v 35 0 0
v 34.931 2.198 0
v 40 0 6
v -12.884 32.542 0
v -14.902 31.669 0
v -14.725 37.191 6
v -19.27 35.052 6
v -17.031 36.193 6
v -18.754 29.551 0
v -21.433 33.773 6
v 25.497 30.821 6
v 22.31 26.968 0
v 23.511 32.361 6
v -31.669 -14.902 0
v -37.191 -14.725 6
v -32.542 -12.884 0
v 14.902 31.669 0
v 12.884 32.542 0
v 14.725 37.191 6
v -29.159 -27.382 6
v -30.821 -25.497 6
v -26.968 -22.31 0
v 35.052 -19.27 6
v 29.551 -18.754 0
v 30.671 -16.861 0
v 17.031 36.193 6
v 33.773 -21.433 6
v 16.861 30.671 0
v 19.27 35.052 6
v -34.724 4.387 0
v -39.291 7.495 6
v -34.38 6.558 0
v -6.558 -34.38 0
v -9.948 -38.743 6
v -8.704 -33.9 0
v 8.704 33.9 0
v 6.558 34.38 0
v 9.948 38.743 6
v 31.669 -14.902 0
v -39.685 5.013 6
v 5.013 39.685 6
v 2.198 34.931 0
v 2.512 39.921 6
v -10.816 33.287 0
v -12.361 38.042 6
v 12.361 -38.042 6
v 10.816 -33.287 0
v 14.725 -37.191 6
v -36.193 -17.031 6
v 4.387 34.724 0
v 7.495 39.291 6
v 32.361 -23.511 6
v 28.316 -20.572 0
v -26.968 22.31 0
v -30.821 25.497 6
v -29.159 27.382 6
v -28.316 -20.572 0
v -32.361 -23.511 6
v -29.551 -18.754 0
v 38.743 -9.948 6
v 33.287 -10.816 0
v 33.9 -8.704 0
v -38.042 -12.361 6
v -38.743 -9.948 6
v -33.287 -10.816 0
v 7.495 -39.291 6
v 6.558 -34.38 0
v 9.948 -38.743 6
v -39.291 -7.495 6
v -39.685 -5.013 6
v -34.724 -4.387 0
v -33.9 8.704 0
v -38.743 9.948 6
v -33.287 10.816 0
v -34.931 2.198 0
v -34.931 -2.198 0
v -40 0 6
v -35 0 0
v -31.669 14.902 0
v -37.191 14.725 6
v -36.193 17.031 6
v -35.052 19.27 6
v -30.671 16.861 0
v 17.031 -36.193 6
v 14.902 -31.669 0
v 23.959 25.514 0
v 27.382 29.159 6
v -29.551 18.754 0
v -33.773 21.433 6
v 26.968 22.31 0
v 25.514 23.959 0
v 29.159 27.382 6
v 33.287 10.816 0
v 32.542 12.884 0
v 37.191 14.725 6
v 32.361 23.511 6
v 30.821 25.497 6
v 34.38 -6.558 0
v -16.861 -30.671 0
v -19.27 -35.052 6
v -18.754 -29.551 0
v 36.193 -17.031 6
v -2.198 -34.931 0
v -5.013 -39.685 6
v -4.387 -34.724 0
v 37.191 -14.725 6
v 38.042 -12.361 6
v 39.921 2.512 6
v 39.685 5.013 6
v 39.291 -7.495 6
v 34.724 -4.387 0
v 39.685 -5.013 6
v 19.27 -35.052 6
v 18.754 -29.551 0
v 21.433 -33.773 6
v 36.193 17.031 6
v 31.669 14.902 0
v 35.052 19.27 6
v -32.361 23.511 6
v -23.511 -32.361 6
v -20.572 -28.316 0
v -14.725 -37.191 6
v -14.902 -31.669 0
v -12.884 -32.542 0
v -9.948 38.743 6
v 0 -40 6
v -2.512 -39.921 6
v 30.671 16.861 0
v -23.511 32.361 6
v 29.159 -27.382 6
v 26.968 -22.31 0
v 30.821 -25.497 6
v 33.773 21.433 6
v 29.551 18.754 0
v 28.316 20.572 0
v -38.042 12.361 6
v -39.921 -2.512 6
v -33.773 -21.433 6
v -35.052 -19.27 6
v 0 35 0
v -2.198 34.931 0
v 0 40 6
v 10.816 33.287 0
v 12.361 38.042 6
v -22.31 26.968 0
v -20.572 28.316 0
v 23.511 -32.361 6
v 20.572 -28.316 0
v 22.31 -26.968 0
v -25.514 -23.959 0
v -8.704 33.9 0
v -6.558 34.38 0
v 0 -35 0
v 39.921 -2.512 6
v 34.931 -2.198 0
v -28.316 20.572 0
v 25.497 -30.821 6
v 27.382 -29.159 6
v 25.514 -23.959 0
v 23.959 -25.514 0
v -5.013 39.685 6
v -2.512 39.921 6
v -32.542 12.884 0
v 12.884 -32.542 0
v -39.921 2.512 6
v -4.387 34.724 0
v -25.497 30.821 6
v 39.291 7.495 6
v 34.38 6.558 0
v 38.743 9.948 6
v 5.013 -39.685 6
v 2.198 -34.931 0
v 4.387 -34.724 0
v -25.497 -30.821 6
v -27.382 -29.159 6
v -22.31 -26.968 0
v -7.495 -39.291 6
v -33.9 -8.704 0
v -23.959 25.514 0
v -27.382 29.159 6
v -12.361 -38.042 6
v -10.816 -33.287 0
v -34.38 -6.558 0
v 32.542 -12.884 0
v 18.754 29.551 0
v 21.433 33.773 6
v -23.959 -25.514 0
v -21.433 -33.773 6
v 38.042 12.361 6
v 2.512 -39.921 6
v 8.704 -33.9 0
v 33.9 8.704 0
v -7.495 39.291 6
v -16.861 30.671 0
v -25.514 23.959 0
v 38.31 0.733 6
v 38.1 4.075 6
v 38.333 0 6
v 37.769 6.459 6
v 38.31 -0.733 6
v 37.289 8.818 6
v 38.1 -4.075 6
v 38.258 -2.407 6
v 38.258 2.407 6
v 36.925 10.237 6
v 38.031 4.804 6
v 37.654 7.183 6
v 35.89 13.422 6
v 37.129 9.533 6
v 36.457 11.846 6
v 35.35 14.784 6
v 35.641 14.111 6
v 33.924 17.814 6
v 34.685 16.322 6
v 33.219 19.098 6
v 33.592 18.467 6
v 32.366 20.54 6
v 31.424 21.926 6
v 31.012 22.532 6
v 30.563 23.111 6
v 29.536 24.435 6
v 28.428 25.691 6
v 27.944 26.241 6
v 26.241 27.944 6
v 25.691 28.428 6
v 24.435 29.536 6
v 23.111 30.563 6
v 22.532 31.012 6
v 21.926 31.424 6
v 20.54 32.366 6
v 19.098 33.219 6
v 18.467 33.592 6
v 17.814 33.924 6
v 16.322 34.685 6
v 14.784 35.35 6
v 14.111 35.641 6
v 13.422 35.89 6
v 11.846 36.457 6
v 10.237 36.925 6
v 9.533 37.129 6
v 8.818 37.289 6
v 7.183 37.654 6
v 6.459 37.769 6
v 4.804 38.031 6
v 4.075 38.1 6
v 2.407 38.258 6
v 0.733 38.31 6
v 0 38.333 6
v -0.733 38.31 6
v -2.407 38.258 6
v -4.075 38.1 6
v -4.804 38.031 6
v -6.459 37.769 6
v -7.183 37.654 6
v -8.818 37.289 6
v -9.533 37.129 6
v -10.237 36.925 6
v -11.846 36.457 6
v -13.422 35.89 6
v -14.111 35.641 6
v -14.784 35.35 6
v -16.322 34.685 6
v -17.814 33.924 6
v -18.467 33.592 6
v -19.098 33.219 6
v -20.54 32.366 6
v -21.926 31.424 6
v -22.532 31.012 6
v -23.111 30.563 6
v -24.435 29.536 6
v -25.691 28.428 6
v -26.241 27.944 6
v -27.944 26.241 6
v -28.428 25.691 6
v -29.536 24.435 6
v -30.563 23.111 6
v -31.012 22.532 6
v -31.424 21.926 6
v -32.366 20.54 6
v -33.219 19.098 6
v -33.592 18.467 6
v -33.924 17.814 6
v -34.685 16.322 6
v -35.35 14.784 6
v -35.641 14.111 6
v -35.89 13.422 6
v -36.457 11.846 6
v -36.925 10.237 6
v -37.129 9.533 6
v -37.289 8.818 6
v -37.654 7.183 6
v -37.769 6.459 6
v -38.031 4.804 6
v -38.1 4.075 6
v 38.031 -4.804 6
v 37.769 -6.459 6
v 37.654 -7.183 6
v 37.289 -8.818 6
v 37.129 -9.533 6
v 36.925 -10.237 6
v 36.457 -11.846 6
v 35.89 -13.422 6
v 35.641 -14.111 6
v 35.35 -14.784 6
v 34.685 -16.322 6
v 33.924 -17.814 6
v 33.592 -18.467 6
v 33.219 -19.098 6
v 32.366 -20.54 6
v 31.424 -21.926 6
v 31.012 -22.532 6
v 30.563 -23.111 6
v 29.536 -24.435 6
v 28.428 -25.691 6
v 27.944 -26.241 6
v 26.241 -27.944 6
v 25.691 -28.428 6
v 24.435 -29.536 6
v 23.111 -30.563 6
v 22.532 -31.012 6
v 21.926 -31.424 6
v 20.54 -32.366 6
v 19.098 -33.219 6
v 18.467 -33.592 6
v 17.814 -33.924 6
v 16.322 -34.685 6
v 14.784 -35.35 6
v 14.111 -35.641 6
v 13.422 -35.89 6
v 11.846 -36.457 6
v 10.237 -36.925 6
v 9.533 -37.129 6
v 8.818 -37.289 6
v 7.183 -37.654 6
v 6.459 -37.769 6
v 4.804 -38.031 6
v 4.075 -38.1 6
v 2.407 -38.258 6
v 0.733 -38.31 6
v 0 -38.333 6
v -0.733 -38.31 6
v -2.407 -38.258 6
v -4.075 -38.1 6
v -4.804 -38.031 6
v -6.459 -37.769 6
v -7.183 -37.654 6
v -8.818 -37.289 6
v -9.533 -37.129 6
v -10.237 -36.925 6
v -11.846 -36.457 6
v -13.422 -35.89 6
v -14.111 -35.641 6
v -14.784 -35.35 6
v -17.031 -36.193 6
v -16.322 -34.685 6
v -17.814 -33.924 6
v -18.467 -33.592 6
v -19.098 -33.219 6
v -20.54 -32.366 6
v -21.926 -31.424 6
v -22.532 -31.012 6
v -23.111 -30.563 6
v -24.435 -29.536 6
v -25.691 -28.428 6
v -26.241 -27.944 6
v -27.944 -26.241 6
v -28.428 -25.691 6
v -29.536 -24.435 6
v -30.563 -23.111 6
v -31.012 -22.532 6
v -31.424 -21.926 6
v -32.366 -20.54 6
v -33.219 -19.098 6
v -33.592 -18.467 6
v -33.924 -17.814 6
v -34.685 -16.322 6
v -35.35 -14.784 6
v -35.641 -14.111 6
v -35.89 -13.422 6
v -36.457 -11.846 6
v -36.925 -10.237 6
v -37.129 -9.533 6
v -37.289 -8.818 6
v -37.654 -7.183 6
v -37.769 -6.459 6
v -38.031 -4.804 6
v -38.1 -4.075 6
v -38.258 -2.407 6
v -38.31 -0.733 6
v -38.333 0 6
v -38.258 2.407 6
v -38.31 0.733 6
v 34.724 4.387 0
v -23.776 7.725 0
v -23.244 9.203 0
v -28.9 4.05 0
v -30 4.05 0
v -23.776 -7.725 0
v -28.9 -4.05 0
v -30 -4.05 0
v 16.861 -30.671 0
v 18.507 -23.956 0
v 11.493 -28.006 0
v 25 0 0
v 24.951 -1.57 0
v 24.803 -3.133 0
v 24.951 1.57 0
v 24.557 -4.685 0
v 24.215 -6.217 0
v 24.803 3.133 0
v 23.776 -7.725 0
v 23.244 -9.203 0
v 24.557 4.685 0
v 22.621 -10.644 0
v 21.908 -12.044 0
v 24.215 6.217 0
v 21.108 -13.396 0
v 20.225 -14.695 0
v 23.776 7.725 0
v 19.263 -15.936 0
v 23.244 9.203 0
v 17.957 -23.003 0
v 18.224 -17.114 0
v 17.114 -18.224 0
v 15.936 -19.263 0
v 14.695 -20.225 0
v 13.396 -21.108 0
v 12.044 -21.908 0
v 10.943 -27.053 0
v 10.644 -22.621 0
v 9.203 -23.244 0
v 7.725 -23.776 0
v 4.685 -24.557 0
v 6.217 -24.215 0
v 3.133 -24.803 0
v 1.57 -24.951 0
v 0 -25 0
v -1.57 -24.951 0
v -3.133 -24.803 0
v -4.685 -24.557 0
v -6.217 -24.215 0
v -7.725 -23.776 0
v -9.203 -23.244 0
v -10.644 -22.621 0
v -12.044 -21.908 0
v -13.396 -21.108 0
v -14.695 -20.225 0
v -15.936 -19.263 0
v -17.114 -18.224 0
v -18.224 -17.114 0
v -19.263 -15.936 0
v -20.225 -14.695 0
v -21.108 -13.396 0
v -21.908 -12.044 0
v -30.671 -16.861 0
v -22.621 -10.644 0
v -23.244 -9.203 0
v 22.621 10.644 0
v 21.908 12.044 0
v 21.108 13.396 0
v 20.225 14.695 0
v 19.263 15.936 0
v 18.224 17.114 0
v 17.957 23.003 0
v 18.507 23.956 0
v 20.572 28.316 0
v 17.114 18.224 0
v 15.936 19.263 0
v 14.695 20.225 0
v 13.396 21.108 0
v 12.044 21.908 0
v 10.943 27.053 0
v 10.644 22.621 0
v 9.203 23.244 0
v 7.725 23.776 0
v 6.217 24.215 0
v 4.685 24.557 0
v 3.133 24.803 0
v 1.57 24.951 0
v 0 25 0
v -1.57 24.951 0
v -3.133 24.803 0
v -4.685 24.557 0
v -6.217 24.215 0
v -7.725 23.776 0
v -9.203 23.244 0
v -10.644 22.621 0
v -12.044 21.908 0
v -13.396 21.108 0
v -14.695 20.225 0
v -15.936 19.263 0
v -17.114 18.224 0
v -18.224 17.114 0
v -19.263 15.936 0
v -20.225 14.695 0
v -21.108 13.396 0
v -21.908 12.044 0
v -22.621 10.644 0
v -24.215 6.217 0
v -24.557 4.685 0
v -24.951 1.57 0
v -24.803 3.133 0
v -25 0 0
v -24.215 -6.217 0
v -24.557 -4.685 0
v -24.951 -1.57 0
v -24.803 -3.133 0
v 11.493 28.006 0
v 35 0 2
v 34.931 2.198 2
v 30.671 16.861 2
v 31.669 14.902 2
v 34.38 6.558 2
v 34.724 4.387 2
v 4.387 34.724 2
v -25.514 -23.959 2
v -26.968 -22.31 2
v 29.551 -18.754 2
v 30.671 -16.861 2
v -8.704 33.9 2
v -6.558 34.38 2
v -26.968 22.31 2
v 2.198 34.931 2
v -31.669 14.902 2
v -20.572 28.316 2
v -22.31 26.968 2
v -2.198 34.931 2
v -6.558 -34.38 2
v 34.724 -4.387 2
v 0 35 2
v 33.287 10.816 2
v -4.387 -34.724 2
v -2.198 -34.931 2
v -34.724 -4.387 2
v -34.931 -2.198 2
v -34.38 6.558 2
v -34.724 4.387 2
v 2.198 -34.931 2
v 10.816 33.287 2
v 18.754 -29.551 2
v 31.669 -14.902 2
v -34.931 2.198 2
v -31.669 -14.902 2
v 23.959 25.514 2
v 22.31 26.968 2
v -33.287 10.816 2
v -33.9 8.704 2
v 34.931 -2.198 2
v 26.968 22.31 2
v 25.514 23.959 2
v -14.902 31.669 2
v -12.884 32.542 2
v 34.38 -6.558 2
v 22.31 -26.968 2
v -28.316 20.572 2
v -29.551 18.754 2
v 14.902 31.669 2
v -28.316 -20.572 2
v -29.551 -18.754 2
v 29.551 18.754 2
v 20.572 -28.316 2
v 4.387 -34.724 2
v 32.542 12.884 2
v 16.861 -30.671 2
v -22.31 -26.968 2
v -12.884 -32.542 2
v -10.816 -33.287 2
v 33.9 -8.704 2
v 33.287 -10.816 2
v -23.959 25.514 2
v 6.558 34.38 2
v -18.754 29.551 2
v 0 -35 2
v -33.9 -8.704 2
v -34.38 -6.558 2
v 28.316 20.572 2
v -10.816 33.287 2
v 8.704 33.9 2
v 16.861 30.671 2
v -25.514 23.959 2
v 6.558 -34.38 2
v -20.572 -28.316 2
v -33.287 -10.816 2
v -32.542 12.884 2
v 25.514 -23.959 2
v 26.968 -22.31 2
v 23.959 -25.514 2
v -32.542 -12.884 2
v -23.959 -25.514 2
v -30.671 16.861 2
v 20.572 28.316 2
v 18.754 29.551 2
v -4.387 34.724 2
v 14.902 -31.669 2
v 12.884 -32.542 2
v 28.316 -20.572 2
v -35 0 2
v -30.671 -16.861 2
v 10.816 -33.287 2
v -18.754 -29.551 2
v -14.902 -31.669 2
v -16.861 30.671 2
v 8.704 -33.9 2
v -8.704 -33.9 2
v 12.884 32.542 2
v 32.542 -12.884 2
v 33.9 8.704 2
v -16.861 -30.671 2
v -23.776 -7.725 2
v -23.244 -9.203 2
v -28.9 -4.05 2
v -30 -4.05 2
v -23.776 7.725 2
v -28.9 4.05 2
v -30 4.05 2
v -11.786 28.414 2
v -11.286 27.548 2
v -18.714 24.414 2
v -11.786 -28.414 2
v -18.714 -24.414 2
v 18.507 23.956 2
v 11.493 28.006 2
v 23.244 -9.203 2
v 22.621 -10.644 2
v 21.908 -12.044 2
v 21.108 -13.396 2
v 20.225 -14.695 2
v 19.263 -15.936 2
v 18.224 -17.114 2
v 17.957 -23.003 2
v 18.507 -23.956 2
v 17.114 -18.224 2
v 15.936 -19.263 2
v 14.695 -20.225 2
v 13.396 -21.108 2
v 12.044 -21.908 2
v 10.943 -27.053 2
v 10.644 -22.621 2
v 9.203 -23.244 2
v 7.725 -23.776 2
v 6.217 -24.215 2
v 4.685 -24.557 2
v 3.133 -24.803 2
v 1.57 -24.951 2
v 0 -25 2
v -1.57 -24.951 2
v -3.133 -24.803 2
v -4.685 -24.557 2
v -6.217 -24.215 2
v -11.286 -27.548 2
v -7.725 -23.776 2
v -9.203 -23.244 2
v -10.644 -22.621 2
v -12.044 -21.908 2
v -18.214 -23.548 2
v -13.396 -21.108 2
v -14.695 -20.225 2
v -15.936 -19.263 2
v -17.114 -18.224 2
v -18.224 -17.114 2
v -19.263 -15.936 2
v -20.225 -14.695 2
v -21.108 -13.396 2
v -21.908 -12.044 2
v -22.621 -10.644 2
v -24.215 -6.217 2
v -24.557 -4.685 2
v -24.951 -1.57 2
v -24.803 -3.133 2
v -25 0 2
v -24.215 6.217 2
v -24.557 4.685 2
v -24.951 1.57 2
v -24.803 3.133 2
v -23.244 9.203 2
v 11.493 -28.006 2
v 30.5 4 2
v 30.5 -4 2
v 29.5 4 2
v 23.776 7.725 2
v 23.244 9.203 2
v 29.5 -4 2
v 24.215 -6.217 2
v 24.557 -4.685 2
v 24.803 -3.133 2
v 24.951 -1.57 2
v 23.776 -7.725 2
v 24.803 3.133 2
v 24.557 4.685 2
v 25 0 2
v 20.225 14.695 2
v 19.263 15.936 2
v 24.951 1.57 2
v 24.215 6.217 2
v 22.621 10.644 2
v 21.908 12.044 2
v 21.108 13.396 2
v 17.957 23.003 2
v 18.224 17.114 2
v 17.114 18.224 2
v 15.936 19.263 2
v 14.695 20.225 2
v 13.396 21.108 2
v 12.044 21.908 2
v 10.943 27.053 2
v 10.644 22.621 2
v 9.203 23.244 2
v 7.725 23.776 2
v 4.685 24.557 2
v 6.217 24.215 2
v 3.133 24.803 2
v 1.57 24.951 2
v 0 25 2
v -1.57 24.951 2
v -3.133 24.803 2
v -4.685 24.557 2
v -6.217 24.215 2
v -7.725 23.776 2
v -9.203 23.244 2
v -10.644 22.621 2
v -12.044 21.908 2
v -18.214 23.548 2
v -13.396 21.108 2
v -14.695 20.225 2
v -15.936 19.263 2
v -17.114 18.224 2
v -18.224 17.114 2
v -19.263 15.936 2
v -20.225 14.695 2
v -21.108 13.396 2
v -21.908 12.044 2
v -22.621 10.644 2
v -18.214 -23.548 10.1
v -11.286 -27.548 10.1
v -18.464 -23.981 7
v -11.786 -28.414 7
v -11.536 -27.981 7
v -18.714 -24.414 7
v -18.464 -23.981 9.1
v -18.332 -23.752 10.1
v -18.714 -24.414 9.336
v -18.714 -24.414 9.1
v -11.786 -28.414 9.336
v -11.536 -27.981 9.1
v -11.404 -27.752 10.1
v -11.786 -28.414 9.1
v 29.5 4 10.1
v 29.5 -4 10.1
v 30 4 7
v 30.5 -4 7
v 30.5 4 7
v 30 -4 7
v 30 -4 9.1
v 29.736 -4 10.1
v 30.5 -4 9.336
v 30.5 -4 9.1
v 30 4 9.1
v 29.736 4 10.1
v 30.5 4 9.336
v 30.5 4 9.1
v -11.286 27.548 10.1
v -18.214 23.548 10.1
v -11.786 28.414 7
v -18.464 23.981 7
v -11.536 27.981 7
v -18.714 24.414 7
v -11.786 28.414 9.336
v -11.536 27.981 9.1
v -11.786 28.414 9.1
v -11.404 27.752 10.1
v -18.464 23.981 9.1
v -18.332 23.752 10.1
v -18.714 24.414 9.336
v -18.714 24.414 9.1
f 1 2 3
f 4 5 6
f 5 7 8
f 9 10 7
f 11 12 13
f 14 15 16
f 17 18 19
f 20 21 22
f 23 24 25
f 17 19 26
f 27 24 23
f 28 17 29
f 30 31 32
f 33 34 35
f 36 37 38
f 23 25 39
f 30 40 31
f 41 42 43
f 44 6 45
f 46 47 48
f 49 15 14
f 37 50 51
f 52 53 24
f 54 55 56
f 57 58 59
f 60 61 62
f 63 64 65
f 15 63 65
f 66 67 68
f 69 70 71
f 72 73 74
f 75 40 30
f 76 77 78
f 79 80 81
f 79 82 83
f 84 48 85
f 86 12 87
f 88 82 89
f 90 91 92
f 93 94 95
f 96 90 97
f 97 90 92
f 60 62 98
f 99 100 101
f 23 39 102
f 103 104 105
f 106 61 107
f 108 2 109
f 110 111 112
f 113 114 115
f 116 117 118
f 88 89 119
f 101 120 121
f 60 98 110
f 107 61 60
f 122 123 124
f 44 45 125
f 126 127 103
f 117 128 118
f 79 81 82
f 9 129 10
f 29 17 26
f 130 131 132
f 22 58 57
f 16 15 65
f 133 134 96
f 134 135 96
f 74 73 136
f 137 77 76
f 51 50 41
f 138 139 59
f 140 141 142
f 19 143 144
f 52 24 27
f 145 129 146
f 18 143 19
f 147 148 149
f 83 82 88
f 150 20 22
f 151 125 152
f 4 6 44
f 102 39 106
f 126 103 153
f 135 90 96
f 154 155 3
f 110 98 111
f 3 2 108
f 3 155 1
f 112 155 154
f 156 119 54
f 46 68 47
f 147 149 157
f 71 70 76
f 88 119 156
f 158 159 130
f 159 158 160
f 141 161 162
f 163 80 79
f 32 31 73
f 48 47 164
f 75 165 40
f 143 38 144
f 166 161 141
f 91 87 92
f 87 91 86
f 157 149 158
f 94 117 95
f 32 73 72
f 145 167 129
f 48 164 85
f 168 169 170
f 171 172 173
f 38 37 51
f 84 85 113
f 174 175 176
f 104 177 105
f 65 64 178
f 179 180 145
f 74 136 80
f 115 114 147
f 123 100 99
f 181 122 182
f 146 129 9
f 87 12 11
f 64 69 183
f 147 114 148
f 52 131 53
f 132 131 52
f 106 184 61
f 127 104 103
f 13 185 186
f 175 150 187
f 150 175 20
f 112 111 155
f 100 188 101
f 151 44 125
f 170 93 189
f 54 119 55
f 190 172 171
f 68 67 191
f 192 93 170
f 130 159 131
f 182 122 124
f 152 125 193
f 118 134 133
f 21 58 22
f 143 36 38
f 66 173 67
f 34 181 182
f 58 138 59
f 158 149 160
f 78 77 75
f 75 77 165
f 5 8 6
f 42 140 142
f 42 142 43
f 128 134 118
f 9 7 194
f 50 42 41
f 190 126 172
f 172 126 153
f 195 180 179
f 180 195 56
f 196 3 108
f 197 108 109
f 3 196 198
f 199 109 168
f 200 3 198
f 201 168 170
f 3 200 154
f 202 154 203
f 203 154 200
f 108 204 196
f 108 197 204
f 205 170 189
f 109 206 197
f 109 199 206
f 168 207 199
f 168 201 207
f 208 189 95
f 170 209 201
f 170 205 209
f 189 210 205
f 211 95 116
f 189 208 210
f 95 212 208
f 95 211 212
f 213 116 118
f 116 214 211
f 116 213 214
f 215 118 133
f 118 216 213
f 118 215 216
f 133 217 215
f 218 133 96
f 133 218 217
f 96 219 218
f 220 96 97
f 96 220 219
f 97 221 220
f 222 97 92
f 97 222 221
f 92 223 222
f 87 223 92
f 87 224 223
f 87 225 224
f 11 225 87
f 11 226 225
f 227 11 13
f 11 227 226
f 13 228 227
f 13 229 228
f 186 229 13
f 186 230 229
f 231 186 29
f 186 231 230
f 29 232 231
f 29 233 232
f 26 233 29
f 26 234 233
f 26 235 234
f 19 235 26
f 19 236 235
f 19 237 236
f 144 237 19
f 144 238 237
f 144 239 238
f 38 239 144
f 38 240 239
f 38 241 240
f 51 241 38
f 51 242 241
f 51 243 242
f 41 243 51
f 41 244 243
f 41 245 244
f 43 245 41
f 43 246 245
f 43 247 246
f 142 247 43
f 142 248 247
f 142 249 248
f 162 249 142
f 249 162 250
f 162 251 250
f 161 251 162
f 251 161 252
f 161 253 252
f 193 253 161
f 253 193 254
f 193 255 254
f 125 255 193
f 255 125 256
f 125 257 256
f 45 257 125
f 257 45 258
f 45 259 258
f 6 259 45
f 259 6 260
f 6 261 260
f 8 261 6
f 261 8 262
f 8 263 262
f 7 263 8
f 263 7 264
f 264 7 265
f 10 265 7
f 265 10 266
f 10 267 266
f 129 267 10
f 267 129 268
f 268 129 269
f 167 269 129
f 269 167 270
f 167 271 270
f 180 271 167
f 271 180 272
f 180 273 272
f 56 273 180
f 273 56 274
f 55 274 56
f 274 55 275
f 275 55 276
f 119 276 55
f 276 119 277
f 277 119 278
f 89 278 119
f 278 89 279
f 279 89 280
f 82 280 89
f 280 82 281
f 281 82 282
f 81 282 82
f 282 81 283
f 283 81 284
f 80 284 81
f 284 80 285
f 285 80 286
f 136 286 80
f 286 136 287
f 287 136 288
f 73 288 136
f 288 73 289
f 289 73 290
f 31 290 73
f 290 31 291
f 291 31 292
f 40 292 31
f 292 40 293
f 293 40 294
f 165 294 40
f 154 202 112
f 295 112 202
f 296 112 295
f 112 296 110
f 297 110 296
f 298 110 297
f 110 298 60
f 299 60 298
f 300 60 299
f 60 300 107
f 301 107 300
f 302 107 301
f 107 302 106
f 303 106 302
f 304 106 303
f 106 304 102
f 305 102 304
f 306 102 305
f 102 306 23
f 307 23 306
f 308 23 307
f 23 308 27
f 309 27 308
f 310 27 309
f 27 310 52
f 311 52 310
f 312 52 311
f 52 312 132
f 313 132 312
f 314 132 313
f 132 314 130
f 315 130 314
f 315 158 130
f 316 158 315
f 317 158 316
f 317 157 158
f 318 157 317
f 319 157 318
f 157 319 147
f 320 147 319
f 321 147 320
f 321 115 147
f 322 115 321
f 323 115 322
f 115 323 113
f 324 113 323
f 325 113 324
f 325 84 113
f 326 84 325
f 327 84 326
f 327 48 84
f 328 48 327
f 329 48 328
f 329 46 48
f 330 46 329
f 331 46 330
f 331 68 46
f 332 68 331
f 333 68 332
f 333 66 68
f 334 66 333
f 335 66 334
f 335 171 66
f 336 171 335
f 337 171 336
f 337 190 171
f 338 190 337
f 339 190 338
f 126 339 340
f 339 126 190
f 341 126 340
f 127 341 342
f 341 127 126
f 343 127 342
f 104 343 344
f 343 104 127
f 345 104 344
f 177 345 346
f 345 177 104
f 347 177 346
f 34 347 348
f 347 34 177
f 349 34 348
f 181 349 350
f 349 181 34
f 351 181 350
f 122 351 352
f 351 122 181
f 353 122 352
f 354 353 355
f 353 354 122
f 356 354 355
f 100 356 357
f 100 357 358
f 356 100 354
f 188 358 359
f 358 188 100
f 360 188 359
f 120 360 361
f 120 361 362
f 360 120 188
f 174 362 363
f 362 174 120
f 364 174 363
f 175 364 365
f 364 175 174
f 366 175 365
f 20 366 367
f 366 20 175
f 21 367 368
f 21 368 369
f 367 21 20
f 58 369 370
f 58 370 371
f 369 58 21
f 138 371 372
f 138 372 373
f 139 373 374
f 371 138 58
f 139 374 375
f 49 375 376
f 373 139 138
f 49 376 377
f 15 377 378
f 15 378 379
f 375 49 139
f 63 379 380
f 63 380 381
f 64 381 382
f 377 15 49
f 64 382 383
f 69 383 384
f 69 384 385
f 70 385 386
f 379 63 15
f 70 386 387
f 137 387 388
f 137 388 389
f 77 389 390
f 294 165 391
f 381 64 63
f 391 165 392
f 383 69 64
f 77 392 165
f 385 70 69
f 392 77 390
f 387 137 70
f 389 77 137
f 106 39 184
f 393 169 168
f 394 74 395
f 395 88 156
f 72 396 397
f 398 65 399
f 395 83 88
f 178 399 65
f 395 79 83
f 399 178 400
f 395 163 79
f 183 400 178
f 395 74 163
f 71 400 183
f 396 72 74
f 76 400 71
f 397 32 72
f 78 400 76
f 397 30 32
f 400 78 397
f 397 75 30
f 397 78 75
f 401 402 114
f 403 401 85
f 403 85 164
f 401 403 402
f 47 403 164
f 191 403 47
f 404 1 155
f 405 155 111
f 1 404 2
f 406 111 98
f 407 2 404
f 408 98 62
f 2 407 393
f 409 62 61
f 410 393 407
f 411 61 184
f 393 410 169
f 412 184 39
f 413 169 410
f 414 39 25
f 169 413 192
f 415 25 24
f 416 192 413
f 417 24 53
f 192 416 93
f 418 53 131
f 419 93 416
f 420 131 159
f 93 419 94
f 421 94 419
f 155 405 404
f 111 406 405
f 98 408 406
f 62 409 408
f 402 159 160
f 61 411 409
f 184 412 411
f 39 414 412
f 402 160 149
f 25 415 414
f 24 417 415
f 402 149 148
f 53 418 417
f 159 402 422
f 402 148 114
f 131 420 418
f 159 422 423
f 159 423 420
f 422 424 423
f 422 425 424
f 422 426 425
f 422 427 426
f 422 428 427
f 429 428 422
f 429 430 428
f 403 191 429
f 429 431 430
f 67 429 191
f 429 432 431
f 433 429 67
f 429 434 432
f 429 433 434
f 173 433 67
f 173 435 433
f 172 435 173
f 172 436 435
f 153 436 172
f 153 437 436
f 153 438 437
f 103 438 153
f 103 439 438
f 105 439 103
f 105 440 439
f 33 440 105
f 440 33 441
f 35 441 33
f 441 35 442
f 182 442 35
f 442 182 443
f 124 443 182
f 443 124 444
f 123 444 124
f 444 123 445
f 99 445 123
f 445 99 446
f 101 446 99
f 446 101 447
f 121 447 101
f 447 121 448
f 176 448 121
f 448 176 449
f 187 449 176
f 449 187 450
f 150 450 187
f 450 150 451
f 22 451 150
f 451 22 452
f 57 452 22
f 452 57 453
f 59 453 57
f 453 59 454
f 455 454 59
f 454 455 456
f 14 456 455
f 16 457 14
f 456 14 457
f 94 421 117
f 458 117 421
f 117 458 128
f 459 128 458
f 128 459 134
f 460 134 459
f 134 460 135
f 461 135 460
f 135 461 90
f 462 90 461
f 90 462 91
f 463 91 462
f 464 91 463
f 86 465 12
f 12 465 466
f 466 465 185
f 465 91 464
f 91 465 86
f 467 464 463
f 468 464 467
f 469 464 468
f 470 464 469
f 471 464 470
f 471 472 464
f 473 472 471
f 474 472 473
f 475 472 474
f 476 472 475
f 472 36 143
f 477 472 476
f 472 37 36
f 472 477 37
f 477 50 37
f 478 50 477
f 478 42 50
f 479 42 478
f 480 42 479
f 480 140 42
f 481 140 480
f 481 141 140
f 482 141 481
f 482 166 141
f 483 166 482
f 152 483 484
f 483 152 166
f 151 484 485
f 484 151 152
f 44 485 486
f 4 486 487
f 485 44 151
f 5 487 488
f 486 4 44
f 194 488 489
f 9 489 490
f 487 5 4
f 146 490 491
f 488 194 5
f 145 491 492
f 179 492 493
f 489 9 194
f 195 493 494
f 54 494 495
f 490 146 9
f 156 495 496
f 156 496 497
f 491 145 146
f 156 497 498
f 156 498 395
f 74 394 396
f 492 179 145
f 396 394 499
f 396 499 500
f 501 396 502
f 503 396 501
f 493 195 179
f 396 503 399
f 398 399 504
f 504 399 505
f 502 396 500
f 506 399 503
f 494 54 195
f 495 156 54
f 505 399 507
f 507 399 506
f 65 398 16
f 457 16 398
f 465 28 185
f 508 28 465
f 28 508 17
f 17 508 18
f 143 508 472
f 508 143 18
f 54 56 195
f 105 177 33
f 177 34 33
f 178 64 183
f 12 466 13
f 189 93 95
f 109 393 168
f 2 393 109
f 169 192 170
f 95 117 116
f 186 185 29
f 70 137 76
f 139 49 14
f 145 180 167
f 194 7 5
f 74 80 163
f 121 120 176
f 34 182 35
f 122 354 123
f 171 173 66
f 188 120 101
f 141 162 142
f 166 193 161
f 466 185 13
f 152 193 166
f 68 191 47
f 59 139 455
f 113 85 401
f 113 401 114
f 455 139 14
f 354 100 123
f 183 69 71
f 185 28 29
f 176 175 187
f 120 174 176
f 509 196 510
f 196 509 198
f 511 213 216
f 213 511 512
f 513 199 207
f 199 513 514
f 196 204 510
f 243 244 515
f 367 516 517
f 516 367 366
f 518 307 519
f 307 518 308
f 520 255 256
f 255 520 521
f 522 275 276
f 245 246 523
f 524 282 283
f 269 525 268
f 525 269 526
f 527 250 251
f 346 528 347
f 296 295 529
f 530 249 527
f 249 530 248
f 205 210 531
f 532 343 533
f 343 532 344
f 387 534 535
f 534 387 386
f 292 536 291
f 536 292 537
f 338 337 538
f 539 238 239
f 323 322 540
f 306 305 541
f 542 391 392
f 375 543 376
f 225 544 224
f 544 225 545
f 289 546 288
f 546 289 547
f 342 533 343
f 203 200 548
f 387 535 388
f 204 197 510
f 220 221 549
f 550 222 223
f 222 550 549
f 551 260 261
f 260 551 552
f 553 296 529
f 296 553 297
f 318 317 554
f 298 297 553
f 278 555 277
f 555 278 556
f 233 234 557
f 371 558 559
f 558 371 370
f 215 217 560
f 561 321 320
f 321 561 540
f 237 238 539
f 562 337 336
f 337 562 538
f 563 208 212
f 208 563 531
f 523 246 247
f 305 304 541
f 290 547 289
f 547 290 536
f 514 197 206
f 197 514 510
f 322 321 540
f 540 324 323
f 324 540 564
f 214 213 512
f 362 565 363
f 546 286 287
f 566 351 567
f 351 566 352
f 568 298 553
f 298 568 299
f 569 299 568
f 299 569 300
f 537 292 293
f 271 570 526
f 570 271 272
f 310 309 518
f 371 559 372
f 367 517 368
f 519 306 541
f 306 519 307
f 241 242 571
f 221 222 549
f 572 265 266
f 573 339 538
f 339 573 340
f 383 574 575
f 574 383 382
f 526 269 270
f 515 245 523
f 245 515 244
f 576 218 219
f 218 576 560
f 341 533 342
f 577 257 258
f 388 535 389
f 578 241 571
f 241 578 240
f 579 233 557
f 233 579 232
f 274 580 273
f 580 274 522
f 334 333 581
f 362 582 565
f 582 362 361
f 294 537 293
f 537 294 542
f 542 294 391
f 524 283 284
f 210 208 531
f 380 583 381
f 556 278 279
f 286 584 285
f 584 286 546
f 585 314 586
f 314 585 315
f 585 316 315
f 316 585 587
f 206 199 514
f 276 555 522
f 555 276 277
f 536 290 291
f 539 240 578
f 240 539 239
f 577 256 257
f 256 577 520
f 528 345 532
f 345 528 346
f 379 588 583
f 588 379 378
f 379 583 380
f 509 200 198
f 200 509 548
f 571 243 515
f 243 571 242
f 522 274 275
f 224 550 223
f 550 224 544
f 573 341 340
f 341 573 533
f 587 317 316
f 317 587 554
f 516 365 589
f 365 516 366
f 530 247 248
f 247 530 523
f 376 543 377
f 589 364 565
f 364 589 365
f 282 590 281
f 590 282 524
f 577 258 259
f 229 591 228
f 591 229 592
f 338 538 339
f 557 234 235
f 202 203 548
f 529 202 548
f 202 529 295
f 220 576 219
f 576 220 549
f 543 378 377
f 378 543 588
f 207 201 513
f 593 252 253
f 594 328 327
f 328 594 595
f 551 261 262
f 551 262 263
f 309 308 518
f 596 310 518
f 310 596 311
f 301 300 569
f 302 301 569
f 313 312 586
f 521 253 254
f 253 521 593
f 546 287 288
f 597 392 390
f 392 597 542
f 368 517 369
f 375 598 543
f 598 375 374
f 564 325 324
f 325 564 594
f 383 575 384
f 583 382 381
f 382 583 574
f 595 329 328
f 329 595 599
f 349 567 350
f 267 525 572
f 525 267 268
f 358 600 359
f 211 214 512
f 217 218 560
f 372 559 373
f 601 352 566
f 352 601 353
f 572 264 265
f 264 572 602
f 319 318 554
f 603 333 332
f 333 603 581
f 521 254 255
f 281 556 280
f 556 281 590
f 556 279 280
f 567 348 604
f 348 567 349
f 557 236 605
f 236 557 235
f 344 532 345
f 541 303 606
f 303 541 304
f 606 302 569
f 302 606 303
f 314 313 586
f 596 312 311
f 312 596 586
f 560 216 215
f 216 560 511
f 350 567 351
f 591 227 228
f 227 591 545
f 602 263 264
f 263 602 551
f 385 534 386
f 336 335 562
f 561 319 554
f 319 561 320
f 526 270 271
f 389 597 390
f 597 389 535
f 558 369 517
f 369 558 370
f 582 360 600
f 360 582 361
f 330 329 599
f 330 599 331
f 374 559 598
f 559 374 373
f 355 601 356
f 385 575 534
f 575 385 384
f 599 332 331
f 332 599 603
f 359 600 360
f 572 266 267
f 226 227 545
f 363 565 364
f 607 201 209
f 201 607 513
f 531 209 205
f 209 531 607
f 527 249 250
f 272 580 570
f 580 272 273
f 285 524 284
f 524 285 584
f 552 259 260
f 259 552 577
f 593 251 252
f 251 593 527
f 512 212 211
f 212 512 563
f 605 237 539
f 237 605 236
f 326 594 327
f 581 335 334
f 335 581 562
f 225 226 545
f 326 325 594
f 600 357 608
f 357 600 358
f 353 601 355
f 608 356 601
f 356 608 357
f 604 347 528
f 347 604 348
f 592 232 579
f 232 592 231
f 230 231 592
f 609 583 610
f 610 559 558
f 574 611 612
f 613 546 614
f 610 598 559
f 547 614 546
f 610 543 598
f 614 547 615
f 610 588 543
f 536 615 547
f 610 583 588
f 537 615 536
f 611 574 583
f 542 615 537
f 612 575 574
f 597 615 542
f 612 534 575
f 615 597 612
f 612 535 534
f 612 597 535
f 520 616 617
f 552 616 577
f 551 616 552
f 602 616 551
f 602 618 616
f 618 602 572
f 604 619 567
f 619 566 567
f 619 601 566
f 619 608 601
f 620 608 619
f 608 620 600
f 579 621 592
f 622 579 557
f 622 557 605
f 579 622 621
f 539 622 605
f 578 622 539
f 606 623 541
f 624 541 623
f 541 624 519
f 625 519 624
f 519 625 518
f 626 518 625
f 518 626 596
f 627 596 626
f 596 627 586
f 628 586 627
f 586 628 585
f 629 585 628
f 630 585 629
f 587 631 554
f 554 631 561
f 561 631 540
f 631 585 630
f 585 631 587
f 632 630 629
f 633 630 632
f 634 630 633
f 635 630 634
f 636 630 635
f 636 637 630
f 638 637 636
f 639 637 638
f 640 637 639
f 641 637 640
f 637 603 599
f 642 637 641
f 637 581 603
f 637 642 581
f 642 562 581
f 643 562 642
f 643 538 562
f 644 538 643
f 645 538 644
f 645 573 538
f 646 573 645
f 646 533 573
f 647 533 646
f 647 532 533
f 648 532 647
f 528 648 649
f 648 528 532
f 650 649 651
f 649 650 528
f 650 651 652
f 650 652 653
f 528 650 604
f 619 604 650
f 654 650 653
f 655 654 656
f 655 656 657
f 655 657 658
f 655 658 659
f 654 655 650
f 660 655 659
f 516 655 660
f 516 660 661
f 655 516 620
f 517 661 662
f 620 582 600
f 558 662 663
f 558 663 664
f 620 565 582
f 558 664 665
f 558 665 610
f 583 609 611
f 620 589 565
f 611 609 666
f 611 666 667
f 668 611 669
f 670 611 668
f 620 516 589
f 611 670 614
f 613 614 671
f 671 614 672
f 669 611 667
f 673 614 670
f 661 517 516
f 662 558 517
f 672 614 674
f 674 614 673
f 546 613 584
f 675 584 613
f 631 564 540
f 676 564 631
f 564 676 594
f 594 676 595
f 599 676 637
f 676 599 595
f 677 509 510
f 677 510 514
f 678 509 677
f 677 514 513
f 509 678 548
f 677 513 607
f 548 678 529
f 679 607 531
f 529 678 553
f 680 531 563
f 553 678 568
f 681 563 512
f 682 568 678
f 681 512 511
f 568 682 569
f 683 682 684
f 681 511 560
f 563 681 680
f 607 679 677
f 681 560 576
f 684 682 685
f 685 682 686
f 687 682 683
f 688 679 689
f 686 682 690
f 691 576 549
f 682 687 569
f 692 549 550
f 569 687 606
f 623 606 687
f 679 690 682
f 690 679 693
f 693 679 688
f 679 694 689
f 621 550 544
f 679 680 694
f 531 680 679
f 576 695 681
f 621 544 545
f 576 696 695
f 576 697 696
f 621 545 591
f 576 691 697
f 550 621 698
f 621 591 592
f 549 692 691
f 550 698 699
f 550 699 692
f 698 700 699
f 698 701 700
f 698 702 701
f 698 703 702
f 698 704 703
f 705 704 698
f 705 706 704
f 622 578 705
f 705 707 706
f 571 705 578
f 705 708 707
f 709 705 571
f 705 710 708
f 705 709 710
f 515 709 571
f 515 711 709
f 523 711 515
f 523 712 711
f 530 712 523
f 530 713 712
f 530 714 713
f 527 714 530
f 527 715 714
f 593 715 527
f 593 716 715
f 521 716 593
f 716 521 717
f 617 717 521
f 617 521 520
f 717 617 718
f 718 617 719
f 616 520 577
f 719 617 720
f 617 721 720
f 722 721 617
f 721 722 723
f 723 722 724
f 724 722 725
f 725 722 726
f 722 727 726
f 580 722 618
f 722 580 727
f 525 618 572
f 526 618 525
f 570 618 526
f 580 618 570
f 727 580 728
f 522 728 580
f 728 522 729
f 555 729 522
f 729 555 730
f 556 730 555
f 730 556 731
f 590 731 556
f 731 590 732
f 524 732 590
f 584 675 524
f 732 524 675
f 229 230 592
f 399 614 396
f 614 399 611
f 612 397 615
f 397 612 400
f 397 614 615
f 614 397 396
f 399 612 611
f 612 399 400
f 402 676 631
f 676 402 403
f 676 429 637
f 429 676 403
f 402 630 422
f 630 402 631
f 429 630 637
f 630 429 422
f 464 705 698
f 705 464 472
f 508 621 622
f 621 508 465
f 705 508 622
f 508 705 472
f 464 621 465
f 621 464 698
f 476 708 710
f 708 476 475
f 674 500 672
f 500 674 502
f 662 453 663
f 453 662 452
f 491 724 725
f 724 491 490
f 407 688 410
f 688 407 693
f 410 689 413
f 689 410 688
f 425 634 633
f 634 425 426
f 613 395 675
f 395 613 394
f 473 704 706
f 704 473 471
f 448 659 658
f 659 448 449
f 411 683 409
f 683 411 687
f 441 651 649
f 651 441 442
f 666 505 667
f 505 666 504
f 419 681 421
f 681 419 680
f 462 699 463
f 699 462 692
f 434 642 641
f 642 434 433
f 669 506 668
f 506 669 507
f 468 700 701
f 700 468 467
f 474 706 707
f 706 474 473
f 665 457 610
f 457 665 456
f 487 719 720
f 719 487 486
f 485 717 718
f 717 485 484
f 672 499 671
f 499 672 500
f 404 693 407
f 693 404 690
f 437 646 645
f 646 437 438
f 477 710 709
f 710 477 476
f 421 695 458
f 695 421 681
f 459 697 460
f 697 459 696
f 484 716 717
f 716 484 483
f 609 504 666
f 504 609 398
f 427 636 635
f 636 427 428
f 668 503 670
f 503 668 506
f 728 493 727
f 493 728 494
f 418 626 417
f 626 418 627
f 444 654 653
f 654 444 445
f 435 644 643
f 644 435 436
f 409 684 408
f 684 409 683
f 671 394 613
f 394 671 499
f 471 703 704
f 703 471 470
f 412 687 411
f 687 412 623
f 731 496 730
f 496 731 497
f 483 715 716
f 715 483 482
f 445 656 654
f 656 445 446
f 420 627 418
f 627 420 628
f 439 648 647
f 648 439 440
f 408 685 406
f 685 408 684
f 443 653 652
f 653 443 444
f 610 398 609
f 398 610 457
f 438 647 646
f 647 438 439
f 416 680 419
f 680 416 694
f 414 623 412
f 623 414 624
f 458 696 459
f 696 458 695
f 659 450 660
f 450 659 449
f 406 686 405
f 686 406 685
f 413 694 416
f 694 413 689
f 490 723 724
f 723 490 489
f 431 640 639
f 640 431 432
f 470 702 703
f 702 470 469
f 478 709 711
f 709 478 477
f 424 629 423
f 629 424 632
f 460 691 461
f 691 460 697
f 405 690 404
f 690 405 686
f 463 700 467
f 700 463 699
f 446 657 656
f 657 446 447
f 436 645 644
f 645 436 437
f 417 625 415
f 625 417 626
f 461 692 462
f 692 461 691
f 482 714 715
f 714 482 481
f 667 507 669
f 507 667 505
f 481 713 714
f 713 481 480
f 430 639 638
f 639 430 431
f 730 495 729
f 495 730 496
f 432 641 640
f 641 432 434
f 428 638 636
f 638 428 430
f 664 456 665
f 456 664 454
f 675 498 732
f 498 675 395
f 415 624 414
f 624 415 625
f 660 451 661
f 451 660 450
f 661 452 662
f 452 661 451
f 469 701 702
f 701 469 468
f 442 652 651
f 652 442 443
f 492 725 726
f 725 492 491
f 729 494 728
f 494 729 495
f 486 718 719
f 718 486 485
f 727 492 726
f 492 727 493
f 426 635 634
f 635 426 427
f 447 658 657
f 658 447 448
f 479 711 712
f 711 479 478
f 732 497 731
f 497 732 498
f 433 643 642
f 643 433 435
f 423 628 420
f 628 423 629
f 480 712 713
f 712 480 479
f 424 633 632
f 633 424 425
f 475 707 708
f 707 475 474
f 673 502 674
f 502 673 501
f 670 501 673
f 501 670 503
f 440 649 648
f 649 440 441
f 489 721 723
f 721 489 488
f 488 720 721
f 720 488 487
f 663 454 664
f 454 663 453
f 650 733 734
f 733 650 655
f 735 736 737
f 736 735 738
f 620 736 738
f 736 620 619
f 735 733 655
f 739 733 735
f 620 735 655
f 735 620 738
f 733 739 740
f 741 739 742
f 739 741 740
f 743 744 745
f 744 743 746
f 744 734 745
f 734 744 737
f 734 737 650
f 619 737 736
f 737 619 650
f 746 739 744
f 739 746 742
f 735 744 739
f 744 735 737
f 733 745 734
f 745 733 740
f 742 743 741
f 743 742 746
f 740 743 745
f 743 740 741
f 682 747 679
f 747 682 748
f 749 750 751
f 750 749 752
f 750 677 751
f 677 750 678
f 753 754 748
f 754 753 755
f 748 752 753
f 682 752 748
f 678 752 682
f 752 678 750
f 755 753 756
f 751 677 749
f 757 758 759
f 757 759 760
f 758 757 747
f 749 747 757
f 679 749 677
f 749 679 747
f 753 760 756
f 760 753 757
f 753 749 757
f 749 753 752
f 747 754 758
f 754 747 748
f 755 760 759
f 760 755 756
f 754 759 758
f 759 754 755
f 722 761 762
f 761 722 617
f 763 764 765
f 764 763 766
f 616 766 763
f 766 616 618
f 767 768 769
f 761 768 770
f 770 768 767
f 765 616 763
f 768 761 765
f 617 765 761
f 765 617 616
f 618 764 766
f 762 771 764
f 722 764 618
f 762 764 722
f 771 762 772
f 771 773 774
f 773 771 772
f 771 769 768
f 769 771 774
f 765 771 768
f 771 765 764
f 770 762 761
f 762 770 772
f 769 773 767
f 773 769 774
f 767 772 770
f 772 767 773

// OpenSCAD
// file: housing.scad
width  = 22.5;
length = 29.0;
height =  1.6;

p_width  = width  + 0.25;
p_length = length + 0.25;
p_height = height + 0.15;

b_width  = width  + 2;
b_length = length;

module disc()
{
    difference()
    {
        cylinder(h=6, r1=35, r2=40, center=false, $fn=100);
        translate([0, 0, 2])
        {
            cylinder(h=6, r1=35, r2=40, center=false, $fn=100);
        }
    }
}

module supports()
{
    for(i=[0:120:360])
    {
        rotate([0, 0, i])
        {
            translate([30, 0, 2])
            {
                difference()
                {
                    cylinder(h=5, r=4, $fn=100);
                    cylinder(h=5, r=1.3, $fn=100);
                }
            }
        }
    }
}

module clippers(w=8)
{
    for(i=[60:120:360]) rotate([0, 0, i]) translate([-30, 0, 0])
    {
        translate([-0.5, -w/2, 2])
            difference()
            {
                union()
                {
                    translate([0, 0, 0]) cube([1, w, 5]);
                    translate([0.5, 0, 5]) cube([0.5, w, 2.1]);
                    translate([0, 0, 7.1]) cube([1, w, 1]);
                }
                translate([-1, 0, 7.75]) rotate([0, 45, 0]) cube([1, w, 2]);
            }
    }
}

module clipping_holes(w=8)
{
    for(i=[0:120:360]) rotate([0, 0, i])
    {
        translate([-30, 0, 0])
        {
            translate([0, -(w + 0.1)/2, 0]) cube([1.1, w + 0.1, 2.1]);
        }
    }
}

module pcb_support()
{
    difference()
    {
        translate([-(b_length)/2+1, -b_width/2, 2]) cube([b_length, b_width, 8]);
        translate([-p_length/2, -p_width/2, 5.5 + p_height])
            cube([p_length, p_width, p_height]);
        translate([-p_length/2, -(width - 1.0)/2, 2]) cube([p_length, width - 1.0, 10]);
        translate([-p_length/2, -p_width/2+1, 5.5 + p_height])
            cube([p_length-13.5, p_width+2, p_height+2]);
        translate([-p_length/2 + 1, -(width-1)/2, 9]) cube([p_length, width - 1.0, 2]);
    }

    translate([-length/2-2, width/2-1,2]) cube([2, 1, 8]);

}

module pcb()
{
    translate([-length/2, -width/2, 5.5 + height]) cube([length, width, height]);
}

module battery_support()
{
    difference()
    {
        translate([-35/2, -22/2, 2]) cube([37,22,9]);
        translate([-37/2, -20/2, 2]) cube([37,20, 8]);
        translate([-37/2, -18/2, 2]) cube([37,18,10]);
    }
}

module cable_hole()
{
    translate([-17.5, 0, 0])
    {
        cylinder(h=6, r1=10, r2=10, center=false, $fn=100);
    }
}

module solar_panel(l=37.5, w=22.5)
{
    union()
    {
        translate([-(l+0.1)/2, -(w+0.1)/2, 1]) cube([l+0.1, w+0.1, 2]);
        translate([-(l-1)/2, -(w-1)/2, 0]) cube([l-1, w-1, 1]);
    }
}
// main file
use <housing.scad>

union()
{
    difference()
    {
        disc();
        clipping_holes();
        cylinder(h=6, r1=25, r2=25, center=false, $fn=100);
    }
    //support();
    clippers();
}
